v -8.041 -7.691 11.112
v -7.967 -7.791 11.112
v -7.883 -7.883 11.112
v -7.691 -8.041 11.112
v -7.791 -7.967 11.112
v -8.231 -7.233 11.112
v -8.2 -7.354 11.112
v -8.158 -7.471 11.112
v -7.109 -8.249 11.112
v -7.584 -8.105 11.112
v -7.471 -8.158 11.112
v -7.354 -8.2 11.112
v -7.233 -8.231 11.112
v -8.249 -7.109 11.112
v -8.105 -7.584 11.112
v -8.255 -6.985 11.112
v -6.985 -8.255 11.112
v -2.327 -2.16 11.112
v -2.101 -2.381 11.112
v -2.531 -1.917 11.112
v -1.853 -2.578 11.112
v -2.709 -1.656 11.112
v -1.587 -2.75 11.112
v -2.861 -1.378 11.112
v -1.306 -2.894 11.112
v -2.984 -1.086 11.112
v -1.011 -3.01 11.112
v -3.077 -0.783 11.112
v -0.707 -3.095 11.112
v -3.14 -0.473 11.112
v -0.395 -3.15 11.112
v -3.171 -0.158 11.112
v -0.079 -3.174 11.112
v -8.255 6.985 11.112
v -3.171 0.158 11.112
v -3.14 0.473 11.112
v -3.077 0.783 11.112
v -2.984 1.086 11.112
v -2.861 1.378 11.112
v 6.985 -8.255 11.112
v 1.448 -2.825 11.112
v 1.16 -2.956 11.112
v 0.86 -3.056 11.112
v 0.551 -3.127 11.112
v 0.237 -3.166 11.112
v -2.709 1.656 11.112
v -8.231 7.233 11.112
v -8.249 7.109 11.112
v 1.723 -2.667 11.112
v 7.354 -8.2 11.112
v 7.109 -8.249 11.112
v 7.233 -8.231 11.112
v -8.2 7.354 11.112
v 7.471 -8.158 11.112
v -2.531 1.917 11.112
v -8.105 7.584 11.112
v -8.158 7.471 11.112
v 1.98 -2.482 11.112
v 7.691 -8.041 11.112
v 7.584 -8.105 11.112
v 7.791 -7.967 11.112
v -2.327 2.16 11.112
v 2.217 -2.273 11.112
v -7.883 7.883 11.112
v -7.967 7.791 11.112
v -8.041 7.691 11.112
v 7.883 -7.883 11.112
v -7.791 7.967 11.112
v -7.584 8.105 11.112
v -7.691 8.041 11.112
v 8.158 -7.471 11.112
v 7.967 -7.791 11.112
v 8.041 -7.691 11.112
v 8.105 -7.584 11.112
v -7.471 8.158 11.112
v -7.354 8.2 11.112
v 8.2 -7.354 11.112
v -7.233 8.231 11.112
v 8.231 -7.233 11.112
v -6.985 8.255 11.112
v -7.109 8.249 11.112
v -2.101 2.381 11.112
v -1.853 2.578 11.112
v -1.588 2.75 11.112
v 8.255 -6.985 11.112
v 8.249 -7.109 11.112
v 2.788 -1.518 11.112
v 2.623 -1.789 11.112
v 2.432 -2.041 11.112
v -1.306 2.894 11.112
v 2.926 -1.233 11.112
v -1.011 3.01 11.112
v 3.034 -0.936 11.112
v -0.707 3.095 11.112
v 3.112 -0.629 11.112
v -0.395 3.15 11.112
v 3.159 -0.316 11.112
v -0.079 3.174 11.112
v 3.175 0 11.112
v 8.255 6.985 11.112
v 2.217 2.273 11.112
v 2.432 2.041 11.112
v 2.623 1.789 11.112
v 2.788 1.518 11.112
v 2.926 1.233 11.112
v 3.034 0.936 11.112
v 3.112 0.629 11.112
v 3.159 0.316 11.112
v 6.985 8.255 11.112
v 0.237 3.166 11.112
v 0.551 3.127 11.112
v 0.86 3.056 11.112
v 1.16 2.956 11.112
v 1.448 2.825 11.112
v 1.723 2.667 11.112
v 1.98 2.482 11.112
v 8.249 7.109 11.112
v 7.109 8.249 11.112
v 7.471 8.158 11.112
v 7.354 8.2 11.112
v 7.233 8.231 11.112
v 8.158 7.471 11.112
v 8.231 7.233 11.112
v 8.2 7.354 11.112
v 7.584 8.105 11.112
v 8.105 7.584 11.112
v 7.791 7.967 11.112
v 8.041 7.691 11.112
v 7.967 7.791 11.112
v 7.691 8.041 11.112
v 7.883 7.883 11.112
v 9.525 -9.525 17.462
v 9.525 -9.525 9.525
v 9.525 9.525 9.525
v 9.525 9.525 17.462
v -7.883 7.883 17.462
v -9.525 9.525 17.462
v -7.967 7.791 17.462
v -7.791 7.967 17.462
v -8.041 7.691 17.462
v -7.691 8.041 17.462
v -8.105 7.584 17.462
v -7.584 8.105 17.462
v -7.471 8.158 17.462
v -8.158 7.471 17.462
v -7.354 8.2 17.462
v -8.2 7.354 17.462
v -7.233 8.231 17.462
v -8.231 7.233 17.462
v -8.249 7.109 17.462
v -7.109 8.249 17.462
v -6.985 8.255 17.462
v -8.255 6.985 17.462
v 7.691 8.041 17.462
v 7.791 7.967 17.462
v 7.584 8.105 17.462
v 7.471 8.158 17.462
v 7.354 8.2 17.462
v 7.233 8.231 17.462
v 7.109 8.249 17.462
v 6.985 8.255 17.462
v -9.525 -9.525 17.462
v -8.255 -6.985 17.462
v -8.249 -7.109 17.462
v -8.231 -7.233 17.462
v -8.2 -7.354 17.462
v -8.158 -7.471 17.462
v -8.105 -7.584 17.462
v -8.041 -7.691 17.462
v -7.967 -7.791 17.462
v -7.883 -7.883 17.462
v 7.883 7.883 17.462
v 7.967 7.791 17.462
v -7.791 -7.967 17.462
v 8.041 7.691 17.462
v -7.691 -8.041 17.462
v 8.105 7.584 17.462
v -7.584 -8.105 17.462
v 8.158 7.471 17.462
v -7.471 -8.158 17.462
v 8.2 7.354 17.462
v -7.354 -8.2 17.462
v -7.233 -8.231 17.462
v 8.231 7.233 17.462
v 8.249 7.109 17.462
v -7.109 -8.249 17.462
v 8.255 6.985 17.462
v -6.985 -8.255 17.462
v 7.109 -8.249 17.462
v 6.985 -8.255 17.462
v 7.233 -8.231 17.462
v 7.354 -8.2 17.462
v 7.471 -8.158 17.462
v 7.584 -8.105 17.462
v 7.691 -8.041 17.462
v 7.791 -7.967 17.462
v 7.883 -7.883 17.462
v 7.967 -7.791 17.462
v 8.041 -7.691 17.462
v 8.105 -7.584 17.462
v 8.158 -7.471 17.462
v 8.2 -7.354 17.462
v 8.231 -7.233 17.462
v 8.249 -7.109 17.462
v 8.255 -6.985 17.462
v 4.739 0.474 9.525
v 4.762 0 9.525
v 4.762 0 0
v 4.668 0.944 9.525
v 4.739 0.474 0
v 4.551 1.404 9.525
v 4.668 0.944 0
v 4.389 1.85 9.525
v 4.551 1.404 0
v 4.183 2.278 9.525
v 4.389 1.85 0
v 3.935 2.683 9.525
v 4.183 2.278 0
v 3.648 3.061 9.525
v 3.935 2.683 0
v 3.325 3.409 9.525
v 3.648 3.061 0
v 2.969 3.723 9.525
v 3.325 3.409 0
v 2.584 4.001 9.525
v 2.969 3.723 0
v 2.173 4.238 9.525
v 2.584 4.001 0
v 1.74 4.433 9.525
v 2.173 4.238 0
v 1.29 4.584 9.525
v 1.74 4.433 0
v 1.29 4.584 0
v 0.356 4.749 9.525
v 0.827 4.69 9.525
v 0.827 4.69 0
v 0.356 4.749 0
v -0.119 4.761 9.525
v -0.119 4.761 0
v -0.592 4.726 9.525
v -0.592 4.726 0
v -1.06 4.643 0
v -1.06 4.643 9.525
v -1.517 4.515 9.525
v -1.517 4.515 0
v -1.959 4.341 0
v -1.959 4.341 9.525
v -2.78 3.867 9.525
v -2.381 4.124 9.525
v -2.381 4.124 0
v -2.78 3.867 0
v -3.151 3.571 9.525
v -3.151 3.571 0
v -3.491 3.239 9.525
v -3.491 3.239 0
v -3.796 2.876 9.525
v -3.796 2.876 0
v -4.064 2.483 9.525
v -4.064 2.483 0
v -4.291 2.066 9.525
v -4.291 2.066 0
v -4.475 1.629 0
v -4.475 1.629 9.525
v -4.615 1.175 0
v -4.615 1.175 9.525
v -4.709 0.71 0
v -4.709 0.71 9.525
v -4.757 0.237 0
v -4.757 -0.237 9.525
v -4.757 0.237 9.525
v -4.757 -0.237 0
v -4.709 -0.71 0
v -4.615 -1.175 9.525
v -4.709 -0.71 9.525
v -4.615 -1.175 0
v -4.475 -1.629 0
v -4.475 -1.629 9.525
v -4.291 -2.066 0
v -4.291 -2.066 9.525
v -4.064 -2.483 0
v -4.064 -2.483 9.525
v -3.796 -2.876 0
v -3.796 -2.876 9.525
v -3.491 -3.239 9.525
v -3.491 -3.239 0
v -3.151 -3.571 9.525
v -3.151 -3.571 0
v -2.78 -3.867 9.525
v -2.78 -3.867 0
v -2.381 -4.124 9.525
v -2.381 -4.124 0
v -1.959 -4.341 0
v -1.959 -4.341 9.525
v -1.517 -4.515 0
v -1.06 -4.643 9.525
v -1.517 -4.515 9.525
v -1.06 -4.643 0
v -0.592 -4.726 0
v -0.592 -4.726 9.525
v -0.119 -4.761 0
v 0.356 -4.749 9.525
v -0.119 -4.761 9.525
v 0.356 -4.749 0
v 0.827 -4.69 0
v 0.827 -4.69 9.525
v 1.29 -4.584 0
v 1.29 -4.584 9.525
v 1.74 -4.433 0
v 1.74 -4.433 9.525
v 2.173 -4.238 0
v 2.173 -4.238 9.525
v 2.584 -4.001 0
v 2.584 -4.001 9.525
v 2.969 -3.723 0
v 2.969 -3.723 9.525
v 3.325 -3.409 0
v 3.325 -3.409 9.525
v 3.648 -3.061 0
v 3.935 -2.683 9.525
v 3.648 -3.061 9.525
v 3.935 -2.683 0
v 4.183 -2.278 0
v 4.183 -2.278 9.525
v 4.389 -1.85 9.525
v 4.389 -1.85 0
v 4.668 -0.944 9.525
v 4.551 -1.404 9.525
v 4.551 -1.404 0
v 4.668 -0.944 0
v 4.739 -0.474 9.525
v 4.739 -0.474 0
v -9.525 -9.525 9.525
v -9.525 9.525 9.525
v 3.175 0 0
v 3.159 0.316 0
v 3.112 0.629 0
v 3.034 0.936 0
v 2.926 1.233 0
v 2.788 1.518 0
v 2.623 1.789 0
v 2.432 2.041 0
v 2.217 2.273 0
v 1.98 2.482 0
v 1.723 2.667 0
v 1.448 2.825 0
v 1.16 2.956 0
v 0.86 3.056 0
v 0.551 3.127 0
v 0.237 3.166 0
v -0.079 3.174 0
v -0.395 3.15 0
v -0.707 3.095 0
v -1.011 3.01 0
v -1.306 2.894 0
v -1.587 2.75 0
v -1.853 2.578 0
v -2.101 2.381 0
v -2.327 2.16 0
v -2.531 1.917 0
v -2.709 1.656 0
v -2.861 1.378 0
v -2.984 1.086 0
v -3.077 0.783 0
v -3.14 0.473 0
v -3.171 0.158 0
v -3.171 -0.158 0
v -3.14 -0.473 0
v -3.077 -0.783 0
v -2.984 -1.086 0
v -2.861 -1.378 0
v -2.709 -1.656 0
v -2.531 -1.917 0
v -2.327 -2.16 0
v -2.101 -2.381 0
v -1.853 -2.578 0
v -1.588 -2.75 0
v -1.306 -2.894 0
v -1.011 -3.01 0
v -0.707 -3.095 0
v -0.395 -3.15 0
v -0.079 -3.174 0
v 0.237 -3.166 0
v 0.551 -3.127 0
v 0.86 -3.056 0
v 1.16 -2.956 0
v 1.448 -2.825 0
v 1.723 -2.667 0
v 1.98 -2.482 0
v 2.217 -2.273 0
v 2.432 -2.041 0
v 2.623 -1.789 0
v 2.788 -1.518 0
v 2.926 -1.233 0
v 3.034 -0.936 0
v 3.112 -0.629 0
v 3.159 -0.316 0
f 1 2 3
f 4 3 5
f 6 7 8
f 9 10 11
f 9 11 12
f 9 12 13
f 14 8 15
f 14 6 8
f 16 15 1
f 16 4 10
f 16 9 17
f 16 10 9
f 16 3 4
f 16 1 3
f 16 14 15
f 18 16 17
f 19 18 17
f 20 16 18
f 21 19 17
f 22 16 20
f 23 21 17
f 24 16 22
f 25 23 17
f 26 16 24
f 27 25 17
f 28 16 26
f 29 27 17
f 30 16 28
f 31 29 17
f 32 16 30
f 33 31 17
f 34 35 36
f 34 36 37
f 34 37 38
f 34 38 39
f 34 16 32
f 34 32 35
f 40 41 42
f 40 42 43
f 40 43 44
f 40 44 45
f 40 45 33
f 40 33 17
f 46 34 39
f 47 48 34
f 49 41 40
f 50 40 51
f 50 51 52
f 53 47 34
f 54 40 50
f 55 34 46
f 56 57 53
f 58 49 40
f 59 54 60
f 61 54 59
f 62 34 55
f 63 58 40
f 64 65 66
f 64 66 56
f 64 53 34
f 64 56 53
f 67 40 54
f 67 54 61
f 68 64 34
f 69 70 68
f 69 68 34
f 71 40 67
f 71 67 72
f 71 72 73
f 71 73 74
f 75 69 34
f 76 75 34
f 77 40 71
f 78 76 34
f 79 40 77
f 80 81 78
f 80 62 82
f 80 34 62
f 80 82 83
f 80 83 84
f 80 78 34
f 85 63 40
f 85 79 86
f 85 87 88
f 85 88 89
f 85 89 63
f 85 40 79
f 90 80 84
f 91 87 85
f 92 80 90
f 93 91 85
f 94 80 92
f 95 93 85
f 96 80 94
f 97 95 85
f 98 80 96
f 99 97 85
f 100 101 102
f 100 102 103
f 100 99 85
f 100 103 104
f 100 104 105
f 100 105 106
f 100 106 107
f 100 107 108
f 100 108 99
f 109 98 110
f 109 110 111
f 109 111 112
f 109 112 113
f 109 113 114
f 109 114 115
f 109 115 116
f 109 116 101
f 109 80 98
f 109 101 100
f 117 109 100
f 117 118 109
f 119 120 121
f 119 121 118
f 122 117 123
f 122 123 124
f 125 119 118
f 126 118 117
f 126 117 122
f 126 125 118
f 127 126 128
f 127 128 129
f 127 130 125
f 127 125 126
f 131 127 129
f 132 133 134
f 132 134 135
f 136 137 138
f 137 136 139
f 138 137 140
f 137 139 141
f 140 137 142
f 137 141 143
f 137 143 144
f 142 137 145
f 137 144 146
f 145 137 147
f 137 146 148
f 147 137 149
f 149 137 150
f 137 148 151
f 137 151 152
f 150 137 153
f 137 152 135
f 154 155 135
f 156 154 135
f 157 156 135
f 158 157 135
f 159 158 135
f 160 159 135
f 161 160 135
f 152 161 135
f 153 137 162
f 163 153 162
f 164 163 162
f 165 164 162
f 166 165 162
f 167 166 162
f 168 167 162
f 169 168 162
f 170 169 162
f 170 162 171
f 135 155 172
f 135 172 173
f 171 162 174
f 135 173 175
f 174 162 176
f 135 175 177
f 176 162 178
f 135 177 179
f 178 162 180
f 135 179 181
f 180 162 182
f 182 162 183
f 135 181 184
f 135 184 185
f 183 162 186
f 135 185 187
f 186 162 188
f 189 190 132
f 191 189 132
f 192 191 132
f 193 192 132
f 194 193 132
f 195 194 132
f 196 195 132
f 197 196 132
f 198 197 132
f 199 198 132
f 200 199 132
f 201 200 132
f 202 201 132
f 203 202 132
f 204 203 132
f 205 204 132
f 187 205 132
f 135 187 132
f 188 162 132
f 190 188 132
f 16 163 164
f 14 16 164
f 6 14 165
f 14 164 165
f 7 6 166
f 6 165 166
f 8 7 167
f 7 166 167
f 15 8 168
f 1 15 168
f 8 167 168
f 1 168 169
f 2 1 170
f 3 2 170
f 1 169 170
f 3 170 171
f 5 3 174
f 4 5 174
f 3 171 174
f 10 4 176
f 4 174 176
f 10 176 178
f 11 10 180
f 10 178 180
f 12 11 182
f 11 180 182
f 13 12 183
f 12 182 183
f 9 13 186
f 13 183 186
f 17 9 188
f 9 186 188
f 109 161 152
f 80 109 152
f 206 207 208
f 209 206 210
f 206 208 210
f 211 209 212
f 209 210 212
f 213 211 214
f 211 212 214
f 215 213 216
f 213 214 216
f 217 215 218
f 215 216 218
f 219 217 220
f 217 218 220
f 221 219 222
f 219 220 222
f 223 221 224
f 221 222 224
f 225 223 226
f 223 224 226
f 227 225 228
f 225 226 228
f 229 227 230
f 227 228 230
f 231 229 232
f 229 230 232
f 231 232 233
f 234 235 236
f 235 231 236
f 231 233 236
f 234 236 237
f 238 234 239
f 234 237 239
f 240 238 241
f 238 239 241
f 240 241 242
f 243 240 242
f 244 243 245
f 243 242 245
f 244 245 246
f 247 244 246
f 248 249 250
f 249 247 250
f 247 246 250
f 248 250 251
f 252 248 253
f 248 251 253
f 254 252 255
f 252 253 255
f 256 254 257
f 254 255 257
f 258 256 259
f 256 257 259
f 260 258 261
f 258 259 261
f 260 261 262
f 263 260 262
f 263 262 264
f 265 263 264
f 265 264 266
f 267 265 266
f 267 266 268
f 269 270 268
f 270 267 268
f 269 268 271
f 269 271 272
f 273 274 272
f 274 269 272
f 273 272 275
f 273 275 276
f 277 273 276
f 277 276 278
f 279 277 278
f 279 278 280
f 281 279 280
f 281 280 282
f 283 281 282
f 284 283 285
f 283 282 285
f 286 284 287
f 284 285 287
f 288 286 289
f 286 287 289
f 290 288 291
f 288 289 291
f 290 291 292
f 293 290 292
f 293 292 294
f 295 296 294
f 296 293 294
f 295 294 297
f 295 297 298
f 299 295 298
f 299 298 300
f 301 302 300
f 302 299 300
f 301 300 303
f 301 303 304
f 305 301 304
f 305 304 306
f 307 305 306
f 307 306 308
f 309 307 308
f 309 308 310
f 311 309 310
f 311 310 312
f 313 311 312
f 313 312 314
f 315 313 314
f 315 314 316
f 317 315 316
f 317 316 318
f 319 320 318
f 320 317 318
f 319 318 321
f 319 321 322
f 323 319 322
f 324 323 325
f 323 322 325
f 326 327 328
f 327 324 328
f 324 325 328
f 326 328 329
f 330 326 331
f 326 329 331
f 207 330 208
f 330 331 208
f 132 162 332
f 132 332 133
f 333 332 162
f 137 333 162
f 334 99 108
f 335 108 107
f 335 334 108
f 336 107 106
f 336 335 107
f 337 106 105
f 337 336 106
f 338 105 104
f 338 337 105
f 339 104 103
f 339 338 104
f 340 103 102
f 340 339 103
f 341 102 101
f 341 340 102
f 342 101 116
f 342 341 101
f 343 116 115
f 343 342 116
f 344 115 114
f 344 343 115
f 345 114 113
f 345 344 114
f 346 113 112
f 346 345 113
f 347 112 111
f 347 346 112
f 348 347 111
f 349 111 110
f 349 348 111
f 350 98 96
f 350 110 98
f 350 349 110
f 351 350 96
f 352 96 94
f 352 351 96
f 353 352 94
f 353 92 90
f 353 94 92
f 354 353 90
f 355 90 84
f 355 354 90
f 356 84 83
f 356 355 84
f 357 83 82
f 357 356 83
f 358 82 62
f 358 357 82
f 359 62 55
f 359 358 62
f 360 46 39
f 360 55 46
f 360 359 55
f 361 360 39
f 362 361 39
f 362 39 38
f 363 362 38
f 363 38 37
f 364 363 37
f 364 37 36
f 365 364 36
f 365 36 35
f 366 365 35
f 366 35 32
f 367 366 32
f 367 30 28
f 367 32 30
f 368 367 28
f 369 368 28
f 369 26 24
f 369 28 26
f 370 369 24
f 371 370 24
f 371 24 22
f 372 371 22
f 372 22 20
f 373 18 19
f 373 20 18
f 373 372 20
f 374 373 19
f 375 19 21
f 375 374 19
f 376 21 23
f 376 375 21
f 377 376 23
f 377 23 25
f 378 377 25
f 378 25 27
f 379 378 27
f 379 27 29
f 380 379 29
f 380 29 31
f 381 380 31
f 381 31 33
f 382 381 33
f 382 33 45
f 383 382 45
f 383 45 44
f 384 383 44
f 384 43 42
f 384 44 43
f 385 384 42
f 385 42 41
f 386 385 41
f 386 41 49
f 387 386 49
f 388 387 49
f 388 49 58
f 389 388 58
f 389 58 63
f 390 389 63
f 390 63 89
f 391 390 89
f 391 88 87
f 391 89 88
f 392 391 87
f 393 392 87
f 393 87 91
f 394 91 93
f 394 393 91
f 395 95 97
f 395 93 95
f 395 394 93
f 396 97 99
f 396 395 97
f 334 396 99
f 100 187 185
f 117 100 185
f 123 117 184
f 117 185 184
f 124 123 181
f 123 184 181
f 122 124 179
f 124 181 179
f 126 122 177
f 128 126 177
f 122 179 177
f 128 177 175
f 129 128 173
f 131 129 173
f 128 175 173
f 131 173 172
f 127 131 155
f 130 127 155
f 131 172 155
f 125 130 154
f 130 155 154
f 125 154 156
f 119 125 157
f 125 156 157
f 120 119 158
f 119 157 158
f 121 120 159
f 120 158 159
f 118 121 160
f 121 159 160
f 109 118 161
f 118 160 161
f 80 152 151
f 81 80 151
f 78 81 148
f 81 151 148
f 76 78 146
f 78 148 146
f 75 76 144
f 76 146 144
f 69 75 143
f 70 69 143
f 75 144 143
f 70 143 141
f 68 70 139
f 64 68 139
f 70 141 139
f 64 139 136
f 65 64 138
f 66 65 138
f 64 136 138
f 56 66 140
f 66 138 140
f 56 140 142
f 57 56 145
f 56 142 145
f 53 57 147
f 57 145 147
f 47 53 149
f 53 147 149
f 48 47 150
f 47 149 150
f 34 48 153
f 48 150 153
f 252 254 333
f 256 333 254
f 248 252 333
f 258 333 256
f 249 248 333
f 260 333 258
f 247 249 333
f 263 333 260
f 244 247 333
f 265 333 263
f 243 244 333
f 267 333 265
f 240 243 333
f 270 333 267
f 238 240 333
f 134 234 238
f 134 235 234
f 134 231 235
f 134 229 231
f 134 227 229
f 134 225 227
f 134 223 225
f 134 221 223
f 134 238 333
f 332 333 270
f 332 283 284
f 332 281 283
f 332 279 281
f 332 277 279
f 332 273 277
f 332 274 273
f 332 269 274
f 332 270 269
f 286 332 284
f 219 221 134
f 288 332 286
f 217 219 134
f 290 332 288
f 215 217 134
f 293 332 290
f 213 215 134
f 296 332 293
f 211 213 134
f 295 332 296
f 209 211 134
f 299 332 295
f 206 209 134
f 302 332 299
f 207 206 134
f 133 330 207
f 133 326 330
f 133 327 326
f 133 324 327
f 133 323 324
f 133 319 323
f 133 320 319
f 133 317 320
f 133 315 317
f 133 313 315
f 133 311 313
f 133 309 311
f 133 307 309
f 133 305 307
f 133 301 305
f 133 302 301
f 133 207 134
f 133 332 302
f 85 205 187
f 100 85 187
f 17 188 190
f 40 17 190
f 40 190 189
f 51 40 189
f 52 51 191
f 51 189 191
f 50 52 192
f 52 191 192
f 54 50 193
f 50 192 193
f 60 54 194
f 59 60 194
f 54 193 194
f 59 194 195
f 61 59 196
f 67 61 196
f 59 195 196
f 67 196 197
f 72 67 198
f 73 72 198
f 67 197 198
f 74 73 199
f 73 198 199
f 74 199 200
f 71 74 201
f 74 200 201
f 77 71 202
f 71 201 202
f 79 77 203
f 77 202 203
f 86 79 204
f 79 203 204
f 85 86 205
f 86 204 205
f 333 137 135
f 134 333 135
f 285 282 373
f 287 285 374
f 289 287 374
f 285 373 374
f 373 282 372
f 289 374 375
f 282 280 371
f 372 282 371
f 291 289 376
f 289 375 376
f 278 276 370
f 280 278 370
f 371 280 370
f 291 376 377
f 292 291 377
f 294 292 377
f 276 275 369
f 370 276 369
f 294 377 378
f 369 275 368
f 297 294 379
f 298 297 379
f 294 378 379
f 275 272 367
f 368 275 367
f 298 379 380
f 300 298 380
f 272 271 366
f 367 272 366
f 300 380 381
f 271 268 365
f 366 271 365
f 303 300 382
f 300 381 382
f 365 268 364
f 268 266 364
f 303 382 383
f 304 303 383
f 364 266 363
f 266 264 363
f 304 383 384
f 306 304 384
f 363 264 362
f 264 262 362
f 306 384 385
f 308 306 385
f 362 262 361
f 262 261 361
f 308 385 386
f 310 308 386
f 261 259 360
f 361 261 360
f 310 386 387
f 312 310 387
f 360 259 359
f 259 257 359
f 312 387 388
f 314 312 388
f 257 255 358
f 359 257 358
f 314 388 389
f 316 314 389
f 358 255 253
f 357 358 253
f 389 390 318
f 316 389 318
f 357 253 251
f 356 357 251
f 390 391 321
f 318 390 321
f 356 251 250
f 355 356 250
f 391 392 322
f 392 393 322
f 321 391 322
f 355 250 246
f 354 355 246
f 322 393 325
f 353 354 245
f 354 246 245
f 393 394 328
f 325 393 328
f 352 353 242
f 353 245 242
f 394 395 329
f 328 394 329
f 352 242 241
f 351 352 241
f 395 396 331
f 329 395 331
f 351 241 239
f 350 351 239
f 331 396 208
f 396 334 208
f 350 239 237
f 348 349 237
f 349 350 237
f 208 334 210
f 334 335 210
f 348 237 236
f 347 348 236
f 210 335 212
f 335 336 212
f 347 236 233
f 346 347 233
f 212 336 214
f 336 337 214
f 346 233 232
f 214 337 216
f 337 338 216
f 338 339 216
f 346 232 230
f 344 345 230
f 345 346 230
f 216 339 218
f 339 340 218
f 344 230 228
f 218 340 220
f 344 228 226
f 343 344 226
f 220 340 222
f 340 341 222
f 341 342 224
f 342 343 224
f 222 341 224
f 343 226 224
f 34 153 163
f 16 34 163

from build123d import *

# Parameters (mm, degrees)
F0_R     = 4.7625
F1_DEPTH = 17.4625
F3_W     = 19.05
F3_H     = 7.9375
F4_DEPTH = 9.525
F6_DEPTH = 6.35
F2_R     = 3.175
F7_DEPTH = 17.4625


with BuildPart() as f1:
    # F0 (on Top) → F1 (new body)
    with BuildSketch(Plane.XY):
        Circle(F0_R)
    extrude(amount=F1_DEPTH)

    # F3 (on Front) → F4 (join, symmetric)
    with BuildSketch(Plane.XZ):
        with Locations((0, 13.49375)):
            Rectangle(F3_W, F3_H)
    extrude(amount=F4_DEPTH, both=True)

    # F5 (on face) → F6 (cut)
    with BuildSketch(Plane.XY.offset(17.4625)):
        with BuildLine():
            Line((6.985, 8.255), (-6.985, 8.255))
            ThreePointArc((-6.985, 8.255), (-7.883026, 7.883026), (-8.255, 6.985))
            Line((-8.255, 6.985), (-8.255, -6.985))
            ThreePointArc((-8.255, -6.985), (-7.883026, -7.883026), (-6.985, -8.255))
            Line((-6.985, -8.255), (6.985, -8.255))
            ThreePointArc((6.985, -8.255), (7.883026, -7.883026), (8.255, -6.985))
            Line((8.255, -6.985), (8.255, 6.985))
            ThreePointArc((8.255, 6.985), (7.883026, 7.883026), (6.985, 8.255))
        make_face()
    extrude(amount=-F6_DEPTH, mode=Mode.SUBTRACT)

    # F2 (on face) → F7 (cut)
    with BuildSketch(Plane.XY):
        Circle(F2_R)
    extrude(amount=F7_DEPTH, mode=Mode.SUBTRACT)


solid = f1.part
